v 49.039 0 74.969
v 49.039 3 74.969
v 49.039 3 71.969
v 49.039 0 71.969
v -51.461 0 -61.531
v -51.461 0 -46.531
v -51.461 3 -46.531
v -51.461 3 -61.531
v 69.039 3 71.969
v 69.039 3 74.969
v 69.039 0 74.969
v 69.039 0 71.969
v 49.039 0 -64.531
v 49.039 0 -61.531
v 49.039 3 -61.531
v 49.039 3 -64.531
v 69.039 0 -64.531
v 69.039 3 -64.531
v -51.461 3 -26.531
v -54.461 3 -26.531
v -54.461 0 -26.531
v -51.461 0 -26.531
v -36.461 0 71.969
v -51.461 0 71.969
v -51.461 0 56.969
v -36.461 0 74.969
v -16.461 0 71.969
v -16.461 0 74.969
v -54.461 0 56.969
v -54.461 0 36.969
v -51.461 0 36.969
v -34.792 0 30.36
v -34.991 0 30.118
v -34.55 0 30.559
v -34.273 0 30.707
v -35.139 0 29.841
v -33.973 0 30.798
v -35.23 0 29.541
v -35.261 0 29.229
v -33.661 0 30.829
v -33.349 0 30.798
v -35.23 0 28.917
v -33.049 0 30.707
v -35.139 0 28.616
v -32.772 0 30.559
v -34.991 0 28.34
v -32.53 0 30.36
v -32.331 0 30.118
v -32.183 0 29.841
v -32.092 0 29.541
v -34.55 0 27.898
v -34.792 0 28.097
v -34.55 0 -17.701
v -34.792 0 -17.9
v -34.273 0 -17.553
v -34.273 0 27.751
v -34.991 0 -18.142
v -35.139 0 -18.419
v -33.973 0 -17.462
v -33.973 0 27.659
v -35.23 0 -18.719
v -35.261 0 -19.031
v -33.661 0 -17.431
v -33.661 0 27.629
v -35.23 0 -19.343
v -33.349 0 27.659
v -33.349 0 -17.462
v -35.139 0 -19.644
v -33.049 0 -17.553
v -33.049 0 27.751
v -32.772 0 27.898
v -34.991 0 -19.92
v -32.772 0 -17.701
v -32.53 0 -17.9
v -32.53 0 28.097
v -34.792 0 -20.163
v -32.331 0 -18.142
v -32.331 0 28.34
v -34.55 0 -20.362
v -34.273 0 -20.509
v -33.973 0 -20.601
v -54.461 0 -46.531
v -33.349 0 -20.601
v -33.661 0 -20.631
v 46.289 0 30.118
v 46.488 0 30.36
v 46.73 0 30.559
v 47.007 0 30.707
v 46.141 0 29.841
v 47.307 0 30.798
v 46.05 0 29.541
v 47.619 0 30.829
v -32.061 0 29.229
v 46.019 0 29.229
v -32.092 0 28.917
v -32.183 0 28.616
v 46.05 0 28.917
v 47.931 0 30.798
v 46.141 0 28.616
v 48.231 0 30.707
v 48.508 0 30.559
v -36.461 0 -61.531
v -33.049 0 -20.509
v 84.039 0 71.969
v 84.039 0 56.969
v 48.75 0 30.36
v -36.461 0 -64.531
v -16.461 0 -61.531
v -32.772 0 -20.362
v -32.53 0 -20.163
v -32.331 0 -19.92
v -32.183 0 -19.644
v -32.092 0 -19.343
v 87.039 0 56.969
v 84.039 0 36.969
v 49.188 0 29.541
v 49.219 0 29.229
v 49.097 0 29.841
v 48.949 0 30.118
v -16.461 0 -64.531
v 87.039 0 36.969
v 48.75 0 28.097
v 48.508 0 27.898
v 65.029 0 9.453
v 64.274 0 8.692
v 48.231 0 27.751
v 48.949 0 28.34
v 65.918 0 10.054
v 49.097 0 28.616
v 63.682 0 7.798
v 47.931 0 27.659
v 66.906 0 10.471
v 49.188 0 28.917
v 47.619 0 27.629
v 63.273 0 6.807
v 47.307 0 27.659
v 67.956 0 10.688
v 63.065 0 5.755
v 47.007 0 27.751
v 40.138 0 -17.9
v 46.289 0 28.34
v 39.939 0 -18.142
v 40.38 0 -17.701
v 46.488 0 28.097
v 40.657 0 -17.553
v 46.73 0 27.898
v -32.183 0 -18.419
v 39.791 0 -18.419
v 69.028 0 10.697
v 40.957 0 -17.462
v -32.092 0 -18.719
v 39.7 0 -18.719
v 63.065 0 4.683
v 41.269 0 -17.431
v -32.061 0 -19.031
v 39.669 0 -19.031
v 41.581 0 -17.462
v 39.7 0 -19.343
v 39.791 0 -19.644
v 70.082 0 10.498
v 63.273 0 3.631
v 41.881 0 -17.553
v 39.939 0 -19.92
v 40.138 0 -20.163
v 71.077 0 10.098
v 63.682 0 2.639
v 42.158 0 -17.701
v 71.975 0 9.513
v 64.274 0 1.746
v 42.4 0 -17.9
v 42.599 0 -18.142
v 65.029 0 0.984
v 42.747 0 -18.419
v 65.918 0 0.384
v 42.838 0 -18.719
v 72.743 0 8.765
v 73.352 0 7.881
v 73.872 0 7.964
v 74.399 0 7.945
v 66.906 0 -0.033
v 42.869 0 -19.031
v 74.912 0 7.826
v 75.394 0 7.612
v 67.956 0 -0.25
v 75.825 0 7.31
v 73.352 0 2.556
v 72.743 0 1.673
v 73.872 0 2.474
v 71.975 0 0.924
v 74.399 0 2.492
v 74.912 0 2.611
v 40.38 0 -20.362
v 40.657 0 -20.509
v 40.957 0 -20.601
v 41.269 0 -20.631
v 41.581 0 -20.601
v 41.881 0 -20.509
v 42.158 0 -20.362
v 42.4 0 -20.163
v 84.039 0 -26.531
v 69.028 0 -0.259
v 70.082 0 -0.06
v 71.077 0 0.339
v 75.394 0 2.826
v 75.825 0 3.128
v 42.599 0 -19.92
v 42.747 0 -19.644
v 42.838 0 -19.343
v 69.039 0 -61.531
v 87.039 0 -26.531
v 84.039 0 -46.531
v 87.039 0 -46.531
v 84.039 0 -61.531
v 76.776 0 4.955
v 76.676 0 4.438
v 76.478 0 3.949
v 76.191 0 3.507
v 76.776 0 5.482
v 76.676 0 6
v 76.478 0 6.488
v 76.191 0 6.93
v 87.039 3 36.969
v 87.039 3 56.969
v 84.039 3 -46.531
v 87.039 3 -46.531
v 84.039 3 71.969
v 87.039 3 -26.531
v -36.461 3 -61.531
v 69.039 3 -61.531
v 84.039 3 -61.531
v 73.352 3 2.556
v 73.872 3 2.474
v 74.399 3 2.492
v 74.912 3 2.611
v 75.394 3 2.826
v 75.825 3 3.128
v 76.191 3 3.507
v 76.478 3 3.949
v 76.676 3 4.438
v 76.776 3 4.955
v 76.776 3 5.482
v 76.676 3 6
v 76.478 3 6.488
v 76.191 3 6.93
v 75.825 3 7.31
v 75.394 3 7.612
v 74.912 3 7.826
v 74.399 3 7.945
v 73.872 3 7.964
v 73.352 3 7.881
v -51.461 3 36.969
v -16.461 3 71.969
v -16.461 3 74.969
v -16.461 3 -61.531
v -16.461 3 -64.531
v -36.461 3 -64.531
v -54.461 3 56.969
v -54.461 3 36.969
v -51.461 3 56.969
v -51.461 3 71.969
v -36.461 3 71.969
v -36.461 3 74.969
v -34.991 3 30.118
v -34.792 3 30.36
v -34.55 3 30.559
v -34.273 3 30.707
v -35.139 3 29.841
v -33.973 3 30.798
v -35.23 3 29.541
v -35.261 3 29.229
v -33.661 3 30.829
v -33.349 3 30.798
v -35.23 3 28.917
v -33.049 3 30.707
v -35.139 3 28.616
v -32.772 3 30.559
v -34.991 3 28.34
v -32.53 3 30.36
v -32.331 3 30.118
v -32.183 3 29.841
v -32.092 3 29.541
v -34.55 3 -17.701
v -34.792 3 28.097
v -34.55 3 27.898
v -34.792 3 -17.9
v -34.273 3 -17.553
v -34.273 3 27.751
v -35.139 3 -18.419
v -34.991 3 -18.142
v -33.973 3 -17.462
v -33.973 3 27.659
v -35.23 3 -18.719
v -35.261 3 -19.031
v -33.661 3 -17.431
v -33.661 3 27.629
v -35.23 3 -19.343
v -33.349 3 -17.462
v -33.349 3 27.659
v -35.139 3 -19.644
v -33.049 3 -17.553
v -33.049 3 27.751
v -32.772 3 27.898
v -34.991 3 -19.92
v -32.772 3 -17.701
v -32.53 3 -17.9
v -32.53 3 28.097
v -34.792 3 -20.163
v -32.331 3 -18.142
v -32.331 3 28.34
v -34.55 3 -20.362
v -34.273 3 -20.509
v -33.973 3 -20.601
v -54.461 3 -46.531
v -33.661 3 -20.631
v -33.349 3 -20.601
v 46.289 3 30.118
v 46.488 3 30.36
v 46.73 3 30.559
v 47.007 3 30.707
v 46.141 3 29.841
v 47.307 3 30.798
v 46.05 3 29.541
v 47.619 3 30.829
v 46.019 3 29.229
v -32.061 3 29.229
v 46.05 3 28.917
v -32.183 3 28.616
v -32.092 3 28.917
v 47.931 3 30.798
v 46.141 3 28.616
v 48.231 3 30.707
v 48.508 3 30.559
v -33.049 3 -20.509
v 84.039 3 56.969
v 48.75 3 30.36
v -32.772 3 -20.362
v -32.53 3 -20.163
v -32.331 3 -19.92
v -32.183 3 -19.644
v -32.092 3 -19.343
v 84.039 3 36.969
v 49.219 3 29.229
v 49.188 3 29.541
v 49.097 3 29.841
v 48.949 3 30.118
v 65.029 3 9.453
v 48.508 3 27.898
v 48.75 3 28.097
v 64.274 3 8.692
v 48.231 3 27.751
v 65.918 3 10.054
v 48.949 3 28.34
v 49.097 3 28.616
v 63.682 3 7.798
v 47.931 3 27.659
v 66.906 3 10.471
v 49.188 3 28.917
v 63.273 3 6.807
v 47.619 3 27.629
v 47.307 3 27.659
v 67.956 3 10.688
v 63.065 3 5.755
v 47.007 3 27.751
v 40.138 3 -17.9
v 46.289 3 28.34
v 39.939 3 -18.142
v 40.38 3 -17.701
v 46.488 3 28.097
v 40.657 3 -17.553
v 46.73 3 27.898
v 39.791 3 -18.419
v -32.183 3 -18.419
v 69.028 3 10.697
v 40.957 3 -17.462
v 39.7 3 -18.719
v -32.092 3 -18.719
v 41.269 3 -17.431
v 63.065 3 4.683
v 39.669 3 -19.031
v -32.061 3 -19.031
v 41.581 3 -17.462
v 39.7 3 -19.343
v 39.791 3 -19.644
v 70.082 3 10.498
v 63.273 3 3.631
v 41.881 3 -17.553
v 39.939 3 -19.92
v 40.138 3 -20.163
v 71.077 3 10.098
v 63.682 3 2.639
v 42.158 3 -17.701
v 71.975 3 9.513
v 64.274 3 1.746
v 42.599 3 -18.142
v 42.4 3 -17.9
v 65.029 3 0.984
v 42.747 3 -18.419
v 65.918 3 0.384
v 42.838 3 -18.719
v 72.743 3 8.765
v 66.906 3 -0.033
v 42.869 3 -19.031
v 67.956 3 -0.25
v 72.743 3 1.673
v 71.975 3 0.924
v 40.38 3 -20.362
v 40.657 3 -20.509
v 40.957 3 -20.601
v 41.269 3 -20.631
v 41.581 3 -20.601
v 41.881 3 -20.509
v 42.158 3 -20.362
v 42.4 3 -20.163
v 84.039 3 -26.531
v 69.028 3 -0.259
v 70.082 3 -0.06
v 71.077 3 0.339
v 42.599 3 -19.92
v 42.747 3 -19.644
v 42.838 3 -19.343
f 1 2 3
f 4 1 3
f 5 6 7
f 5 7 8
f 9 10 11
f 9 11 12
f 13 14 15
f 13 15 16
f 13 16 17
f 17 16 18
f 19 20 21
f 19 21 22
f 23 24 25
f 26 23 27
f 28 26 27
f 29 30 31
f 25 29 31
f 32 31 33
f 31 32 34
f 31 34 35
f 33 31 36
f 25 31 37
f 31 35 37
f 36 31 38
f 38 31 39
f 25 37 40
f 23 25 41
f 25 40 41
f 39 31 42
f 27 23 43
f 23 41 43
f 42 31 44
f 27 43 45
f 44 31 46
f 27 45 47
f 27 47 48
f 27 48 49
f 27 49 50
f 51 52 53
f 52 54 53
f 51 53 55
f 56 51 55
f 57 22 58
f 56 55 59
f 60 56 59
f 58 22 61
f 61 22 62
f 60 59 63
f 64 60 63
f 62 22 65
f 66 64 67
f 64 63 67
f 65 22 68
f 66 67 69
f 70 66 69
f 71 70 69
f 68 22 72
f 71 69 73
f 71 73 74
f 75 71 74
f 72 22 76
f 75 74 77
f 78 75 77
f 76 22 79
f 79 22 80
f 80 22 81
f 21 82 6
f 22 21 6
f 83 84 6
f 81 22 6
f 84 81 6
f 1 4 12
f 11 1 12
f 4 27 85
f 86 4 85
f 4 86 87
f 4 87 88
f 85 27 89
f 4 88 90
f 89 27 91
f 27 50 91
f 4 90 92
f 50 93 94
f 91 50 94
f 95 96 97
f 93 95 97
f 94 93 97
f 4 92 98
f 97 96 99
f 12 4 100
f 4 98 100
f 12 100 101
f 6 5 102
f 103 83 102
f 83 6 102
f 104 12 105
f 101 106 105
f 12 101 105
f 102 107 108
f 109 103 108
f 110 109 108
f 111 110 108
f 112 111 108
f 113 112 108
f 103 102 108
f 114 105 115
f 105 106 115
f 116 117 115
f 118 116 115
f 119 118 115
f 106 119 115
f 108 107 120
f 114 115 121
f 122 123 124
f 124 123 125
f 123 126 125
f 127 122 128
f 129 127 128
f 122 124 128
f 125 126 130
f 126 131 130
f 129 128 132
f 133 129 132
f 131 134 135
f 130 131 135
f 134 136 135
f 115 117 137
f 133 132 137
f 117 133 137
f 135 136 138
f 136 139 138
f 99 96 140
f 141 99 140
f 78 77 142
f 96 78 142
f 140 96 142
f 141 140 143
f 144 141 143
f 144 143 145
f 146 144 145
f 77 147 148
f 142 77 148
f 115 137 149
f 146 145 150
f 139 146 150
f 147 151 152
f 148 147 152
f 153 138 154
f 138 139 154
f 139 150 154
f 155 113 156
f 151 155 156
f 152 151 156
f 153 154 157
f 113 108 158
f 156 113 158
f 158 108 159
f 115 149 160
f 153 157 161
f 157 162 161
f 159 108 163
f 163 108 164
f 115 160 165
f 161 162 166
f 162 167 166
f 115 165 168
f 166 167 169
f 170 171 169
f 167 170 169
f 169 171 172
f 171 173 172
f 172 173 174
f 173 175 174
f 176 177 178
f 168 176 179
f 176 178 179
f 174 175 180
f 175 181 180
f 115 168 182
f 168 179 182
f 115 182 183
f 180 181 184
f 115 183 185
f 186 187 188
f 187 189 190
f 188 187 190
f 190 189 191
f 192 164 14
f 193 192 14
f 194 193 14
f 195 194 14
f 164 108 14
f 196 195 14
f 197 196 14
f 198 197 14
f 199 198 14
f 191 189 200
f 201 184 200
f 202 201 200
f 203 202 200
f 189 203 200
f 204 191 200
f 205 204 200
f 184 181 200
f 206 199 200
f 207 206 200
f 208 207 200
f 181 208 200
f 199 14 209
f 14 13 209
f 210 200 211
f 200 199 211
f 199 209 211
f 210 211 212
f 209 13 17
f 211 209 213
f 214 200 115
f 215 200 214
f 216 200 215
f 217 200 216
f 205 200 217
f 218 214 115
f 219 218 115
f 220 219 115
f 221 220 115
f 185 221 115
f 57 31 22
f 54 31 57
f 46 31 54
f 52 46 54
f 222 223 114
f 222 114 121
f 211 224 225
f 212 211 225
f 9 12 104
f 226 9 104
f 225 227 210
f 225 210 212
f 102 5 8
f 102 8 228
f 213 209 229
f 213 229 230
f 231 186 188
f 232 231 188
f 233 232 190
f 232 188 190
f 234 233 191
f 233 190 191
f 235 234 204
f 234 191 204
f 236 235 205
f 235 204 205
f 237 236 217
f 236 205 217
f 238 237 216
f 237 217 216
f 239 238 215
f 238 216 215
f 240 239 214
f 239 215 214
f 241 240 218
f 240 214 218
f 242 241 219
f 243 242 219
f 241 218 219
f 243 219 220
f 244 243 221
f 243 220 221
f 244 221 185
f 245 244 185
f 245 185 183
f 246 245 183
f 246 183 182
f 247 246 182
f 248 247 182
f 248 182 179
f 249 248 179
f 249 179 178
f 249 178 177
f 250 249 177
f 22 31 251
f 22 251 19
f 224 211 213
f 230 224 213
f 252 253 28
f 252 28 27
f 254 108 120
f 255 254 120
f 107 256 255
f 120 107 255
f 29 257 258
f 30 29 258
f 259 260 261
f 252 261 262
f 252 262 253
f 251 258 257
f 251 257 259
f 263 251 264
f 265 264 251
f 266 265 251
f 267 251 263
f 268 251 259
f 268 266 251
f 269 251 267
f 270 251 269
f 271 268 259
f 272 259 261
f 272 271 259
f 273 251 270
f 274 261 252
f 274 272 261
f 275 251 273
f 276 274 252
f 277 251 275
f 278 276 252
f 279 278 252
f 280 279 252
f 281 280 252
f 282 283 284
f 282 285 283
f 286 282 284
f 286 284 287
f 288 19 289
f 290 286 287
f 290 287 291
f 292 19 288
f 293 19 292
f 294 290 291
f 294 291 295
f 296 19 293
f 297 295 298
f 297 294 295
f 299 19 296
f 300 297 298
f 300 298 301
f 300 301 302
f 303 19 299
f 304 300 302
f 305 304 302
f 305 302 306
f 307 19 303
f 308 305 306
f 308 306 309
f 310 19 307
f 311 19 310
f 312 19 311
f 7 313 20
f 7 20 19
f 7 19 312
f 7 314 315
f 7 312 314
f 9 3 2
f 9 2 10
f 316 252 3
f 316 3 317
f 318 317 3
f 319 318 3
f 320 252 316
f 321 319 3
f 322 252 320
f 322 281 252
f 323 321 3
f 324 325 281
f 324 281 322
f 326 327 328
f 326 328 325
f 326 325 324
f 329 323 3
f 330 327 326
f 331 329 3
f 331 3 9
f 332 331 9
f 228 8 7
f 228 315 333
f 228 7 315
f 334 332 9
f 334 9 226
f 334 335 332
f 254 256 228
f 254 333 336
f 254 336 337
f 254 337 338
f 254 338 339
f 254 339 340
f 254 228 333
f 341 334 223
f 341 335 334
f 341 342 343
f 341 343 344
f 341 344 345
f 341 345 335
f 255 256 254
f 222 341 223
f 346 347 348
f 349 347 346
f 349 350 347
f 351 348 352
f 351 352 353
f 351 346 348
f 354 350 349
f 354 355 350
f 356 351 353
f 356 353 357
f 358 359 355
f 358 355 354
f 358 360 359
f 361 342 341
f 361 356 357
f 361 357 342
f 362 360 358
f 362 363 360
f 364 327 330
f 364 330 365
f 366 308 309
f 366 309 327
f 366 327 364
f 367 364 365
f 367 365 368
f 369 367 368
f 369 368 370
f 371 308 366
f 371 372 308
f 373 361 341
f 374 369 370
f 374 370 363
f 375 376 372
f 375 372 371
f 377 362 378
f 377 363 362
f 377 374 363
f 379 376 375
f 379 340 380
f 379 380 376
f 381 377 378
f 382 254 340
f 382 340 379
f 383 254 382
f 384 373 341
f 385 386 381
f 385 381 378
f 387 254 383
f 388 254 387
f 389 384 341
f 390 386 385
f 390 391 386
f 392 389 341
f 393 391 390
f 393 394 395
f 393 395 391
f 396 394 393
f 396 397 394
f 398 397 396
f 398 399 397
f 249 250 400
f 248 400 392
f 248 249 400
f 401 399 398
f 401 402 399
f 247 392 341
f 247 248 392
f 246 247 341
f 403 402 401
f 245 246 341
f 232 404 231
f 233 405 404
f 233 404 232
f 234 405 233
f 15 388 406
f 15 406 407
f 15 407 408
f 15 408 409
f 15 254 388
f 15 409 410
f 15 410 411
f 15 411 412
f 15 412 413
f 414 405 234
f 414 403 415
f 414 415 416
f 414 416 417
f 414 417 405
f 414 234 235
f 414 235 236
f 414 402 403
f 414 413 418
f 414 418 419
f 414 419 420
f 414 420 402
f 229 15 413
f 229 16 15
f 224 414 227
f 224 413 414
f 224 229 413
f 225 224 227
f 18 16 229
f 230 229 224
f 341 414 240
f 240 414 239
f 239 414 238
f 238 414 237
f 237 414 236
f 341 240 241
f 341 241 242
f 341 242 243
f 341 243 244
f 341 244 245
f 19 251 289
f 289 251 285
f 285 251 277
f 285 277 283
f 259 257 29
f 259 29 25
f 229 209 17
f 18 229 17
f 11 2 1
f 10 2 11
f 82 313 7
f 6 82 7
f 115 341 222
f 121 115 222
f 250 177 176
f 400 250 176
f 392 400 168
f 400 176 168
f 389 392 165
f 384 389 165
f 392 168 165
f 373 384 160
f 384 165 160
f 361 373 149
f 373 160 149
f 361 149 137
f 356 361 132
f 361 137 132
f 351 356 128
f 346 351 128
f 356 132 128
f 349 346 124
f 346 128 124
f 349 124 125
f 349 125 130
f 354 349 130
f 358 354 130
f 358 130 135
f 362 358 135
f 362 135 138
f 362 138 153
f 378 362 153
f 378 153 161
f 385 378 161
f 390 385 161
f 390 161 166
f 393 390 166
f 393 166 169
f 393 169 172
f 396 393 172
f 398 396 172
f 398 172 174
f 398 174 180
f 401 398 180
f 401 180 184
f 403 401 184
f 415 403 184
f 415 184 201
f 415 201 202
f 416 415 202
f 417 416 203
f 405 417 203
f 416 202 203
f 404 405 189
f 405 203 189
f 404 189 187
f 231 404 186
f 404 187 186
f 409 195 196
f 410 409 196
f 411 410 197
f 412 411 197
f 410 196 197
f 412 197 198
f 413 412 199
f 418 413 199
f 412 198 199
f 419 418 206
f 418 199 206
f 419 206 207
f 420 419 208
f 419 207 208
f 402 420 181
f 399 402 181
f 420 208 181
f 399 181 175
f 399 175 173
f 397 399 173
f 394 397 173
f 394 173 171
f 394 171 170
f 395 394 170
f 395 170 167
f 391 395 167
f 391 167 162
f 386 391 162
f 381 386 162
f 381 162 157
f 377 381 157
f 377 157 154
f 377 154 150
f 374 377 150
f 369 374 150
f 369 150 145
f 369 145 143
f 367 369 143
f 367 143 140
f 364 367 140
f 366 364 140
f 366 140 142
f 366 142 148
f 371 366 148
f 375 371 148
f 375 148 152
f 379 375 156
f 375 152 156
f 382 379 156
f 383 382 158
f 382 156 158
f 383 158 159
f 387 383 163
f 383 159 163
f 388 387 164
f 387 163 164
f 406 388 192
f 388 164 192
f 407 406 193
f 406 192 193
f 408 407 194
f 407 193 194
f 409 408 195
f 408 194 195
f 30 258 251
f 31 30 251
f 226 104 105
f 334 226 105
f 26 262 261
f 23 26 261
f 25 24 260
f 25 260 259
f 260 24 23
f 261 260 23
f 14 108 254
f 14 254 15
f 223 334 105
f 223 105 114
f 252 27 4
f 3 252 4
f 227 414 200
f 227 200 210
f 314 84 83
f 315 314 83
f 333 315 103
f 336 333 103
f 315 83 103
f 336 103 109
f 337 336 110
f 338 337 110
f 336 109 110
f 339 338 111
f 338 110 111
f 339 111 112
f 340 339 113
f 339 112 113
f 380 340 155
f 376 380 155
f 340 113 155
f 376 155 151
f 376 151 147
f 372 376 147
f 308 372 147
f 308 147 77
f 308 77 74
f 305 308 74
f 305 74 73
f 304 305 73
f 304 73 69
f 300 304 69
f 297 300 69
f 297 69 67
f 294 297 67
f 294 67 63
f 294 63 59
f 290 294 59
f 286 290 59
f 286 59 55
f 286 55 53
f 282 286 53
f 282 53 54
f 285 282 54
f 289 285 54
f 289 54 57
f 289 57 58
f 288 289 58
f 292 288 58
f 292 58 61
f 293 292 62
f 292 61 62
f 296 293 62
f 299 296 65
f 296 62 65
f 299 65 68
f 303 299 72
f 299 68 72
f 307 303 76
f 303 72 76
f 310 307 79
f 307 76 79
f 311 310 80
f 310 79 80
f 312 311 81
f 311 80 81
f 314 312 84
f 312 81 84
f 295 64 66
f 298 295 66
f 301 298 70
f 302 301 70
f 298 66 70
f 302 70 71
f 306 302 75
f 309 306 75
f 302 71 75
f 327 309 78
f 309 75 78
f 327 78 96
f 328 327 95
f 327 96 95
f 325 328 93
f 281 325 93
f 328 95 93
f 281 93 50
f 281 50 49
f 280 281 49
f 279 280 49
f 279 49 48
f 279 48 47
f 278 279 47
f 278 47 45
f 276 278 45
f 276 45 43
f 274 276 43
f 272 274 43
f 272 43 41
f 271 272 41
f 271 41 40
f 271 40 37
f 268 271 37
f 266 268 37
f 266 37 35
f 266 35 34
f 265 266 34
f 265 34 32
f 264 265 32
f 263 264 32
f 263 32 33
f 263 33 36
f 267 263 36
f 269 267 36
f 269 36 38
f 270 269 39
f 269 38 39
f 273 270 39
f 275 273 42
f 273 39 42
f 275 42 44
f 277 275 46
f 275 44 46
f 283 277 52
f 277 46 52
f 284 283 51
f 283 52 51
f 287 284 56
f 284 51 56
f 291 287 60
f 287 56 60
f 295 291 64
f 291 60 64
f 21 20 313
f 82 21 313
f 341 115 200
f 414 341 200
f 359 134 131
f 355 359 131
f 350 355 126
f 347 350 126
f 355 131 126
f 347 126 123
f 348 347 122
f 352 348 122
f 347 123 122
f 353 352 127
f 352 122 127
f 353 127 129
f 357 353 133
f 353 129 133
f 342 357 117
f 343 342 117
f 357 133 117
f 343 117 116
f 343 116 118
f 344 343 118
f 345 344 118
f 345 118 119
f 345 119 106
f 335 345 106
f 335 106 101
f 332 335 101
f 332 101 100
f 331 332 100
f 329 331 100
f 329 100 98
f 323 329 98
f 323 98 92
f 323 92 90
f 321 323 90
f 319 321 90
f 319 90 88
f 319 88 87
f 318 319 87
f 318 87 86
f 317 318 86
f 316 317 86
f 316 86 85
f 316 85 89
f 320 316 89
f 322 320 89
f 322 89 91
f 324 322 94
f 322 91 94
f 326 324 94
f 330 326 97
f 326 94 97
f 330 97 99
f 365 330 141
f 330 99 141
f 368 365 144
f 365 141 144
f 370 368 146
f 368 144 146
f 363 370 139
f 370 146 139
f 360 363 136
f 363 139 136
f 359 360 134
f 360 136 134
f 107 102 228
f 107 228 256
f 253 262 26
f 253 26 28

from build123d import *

# Parameters (mm, degrees)
SKETCH1_W           = 135.499999433
SKETCH1_H           = 133.500000387
BOSS_EXTRUDE1_DEPTH = 3
SKETCH2_W           = 3
SKETCH2_H           = 20
SKETCH2_W_2         = 20
SKETCH2_H_2         = 3
BOSS_EXTRUDE2_DEPTH = 3
SKETCH3_R           = 1.6
CUT_EXTRUDE1_DEPTH  = 115.913475286
SKETCH4_R           = 5.5
SKETCH4_R_2         = 2.75
CUT_EXTRUDE2_DEPTH  = 115.913475286


with BuildPart() as part:
    # Sketch1 → Boss-Extrude1 (new body)
    with BuildSketch(Plane(origin=(0, 0, 0), x_dir=(1, 0, 0), z_dir=(0, 1, 0))):
        with Locations((16.289033152, -5.21875036)):
            Rectangle(SKETCH1_W, SKETCH1_H)
    extrude(amount=BOSS_EXTRUDE1_DEPTH)

    # Sketch2 → Boss-Extrude2 (add, through all)
    with BuildSketch(Plane(origin=(0, 3, 0), x_dir=(1, 0, 0), z_dir=(0, 1, 0))):
        with Locations((85.539032868, 36.531249834)):
            Rectangle(SKETCH2_W, SKETCH2_H)
        with Locations((85.539032868, -46.968750553)):
            Rectangle(SKETCH2_W, SKETCH2_H)
        with Locations((59.039032868, 63.031249834)):
            Rectangle(SKETCH2_W_2, SKETCH2_H_2)
        with Locations((-26.460966565, 63.031249834)):
            Rectangle(SKETCH2_W_2, SKETCH2_H_2)
        with Locations((-52.960966565, 36.531249834)):
            Rectangle(SKETCH2_W, SKETCH2_H)
        with Locations((-52.960966565, -46.968750553)):
            Rectangle(SKETCH2_W, SKETCH2_H)
        with Locations((-26.460966565, -73.468750553)):
            Rectangle(SKETCH2_W_2, SKETCH2_H_2)
        with Locations((59.039032868, -73.468750553)):
            Rectangle(SKETCH2_W_2, SKETCH2_H_2)
    extrude(amount=-BOSS_EXTRUDE2_DEPTH)

    # Sketch3 → Cut-Extrude1 (cut, through all)
    with BuildSketch(Plane.XZ):
        with Locations(Location((-33.660968451, 29.22874915, 0), (0, 0, 270))):
            Circle(SKETCH3_R)
        with Locations(Location((47.619031549, 29.22874915, 0), (0, 0, 270))):
            Circle(SKETCH3_R)
        with Locations(Location((41.269031549, -19.03125085, 0), (0, 0, 270))):
            Circle(SKETCH3_R)
        with Locations(Location((-33.660968451, -19.03125085, 0), (0, 0, 270))):
            Circle(SKETCH3_R)
    extrude(amount=-CUT_EXTRUDE1_DEPTH, mode=Mode.SUBTRACT)

    # Sketch4 → Cut-Extrude2 (cut, through all)
    with BuildSketch(Plane.XZ):
        with Locations((68.539032868, 5.21875036)):
            Circle(SKETCH4_R)
        with Locations((74.039032868, 5.21875036)):
            Circle(SKETCH4_R_2)
    extrude(amount=-CUT_EXTRUDE2_DEPTH, mode=Mode.SUBTRACT)


solid = part.part
